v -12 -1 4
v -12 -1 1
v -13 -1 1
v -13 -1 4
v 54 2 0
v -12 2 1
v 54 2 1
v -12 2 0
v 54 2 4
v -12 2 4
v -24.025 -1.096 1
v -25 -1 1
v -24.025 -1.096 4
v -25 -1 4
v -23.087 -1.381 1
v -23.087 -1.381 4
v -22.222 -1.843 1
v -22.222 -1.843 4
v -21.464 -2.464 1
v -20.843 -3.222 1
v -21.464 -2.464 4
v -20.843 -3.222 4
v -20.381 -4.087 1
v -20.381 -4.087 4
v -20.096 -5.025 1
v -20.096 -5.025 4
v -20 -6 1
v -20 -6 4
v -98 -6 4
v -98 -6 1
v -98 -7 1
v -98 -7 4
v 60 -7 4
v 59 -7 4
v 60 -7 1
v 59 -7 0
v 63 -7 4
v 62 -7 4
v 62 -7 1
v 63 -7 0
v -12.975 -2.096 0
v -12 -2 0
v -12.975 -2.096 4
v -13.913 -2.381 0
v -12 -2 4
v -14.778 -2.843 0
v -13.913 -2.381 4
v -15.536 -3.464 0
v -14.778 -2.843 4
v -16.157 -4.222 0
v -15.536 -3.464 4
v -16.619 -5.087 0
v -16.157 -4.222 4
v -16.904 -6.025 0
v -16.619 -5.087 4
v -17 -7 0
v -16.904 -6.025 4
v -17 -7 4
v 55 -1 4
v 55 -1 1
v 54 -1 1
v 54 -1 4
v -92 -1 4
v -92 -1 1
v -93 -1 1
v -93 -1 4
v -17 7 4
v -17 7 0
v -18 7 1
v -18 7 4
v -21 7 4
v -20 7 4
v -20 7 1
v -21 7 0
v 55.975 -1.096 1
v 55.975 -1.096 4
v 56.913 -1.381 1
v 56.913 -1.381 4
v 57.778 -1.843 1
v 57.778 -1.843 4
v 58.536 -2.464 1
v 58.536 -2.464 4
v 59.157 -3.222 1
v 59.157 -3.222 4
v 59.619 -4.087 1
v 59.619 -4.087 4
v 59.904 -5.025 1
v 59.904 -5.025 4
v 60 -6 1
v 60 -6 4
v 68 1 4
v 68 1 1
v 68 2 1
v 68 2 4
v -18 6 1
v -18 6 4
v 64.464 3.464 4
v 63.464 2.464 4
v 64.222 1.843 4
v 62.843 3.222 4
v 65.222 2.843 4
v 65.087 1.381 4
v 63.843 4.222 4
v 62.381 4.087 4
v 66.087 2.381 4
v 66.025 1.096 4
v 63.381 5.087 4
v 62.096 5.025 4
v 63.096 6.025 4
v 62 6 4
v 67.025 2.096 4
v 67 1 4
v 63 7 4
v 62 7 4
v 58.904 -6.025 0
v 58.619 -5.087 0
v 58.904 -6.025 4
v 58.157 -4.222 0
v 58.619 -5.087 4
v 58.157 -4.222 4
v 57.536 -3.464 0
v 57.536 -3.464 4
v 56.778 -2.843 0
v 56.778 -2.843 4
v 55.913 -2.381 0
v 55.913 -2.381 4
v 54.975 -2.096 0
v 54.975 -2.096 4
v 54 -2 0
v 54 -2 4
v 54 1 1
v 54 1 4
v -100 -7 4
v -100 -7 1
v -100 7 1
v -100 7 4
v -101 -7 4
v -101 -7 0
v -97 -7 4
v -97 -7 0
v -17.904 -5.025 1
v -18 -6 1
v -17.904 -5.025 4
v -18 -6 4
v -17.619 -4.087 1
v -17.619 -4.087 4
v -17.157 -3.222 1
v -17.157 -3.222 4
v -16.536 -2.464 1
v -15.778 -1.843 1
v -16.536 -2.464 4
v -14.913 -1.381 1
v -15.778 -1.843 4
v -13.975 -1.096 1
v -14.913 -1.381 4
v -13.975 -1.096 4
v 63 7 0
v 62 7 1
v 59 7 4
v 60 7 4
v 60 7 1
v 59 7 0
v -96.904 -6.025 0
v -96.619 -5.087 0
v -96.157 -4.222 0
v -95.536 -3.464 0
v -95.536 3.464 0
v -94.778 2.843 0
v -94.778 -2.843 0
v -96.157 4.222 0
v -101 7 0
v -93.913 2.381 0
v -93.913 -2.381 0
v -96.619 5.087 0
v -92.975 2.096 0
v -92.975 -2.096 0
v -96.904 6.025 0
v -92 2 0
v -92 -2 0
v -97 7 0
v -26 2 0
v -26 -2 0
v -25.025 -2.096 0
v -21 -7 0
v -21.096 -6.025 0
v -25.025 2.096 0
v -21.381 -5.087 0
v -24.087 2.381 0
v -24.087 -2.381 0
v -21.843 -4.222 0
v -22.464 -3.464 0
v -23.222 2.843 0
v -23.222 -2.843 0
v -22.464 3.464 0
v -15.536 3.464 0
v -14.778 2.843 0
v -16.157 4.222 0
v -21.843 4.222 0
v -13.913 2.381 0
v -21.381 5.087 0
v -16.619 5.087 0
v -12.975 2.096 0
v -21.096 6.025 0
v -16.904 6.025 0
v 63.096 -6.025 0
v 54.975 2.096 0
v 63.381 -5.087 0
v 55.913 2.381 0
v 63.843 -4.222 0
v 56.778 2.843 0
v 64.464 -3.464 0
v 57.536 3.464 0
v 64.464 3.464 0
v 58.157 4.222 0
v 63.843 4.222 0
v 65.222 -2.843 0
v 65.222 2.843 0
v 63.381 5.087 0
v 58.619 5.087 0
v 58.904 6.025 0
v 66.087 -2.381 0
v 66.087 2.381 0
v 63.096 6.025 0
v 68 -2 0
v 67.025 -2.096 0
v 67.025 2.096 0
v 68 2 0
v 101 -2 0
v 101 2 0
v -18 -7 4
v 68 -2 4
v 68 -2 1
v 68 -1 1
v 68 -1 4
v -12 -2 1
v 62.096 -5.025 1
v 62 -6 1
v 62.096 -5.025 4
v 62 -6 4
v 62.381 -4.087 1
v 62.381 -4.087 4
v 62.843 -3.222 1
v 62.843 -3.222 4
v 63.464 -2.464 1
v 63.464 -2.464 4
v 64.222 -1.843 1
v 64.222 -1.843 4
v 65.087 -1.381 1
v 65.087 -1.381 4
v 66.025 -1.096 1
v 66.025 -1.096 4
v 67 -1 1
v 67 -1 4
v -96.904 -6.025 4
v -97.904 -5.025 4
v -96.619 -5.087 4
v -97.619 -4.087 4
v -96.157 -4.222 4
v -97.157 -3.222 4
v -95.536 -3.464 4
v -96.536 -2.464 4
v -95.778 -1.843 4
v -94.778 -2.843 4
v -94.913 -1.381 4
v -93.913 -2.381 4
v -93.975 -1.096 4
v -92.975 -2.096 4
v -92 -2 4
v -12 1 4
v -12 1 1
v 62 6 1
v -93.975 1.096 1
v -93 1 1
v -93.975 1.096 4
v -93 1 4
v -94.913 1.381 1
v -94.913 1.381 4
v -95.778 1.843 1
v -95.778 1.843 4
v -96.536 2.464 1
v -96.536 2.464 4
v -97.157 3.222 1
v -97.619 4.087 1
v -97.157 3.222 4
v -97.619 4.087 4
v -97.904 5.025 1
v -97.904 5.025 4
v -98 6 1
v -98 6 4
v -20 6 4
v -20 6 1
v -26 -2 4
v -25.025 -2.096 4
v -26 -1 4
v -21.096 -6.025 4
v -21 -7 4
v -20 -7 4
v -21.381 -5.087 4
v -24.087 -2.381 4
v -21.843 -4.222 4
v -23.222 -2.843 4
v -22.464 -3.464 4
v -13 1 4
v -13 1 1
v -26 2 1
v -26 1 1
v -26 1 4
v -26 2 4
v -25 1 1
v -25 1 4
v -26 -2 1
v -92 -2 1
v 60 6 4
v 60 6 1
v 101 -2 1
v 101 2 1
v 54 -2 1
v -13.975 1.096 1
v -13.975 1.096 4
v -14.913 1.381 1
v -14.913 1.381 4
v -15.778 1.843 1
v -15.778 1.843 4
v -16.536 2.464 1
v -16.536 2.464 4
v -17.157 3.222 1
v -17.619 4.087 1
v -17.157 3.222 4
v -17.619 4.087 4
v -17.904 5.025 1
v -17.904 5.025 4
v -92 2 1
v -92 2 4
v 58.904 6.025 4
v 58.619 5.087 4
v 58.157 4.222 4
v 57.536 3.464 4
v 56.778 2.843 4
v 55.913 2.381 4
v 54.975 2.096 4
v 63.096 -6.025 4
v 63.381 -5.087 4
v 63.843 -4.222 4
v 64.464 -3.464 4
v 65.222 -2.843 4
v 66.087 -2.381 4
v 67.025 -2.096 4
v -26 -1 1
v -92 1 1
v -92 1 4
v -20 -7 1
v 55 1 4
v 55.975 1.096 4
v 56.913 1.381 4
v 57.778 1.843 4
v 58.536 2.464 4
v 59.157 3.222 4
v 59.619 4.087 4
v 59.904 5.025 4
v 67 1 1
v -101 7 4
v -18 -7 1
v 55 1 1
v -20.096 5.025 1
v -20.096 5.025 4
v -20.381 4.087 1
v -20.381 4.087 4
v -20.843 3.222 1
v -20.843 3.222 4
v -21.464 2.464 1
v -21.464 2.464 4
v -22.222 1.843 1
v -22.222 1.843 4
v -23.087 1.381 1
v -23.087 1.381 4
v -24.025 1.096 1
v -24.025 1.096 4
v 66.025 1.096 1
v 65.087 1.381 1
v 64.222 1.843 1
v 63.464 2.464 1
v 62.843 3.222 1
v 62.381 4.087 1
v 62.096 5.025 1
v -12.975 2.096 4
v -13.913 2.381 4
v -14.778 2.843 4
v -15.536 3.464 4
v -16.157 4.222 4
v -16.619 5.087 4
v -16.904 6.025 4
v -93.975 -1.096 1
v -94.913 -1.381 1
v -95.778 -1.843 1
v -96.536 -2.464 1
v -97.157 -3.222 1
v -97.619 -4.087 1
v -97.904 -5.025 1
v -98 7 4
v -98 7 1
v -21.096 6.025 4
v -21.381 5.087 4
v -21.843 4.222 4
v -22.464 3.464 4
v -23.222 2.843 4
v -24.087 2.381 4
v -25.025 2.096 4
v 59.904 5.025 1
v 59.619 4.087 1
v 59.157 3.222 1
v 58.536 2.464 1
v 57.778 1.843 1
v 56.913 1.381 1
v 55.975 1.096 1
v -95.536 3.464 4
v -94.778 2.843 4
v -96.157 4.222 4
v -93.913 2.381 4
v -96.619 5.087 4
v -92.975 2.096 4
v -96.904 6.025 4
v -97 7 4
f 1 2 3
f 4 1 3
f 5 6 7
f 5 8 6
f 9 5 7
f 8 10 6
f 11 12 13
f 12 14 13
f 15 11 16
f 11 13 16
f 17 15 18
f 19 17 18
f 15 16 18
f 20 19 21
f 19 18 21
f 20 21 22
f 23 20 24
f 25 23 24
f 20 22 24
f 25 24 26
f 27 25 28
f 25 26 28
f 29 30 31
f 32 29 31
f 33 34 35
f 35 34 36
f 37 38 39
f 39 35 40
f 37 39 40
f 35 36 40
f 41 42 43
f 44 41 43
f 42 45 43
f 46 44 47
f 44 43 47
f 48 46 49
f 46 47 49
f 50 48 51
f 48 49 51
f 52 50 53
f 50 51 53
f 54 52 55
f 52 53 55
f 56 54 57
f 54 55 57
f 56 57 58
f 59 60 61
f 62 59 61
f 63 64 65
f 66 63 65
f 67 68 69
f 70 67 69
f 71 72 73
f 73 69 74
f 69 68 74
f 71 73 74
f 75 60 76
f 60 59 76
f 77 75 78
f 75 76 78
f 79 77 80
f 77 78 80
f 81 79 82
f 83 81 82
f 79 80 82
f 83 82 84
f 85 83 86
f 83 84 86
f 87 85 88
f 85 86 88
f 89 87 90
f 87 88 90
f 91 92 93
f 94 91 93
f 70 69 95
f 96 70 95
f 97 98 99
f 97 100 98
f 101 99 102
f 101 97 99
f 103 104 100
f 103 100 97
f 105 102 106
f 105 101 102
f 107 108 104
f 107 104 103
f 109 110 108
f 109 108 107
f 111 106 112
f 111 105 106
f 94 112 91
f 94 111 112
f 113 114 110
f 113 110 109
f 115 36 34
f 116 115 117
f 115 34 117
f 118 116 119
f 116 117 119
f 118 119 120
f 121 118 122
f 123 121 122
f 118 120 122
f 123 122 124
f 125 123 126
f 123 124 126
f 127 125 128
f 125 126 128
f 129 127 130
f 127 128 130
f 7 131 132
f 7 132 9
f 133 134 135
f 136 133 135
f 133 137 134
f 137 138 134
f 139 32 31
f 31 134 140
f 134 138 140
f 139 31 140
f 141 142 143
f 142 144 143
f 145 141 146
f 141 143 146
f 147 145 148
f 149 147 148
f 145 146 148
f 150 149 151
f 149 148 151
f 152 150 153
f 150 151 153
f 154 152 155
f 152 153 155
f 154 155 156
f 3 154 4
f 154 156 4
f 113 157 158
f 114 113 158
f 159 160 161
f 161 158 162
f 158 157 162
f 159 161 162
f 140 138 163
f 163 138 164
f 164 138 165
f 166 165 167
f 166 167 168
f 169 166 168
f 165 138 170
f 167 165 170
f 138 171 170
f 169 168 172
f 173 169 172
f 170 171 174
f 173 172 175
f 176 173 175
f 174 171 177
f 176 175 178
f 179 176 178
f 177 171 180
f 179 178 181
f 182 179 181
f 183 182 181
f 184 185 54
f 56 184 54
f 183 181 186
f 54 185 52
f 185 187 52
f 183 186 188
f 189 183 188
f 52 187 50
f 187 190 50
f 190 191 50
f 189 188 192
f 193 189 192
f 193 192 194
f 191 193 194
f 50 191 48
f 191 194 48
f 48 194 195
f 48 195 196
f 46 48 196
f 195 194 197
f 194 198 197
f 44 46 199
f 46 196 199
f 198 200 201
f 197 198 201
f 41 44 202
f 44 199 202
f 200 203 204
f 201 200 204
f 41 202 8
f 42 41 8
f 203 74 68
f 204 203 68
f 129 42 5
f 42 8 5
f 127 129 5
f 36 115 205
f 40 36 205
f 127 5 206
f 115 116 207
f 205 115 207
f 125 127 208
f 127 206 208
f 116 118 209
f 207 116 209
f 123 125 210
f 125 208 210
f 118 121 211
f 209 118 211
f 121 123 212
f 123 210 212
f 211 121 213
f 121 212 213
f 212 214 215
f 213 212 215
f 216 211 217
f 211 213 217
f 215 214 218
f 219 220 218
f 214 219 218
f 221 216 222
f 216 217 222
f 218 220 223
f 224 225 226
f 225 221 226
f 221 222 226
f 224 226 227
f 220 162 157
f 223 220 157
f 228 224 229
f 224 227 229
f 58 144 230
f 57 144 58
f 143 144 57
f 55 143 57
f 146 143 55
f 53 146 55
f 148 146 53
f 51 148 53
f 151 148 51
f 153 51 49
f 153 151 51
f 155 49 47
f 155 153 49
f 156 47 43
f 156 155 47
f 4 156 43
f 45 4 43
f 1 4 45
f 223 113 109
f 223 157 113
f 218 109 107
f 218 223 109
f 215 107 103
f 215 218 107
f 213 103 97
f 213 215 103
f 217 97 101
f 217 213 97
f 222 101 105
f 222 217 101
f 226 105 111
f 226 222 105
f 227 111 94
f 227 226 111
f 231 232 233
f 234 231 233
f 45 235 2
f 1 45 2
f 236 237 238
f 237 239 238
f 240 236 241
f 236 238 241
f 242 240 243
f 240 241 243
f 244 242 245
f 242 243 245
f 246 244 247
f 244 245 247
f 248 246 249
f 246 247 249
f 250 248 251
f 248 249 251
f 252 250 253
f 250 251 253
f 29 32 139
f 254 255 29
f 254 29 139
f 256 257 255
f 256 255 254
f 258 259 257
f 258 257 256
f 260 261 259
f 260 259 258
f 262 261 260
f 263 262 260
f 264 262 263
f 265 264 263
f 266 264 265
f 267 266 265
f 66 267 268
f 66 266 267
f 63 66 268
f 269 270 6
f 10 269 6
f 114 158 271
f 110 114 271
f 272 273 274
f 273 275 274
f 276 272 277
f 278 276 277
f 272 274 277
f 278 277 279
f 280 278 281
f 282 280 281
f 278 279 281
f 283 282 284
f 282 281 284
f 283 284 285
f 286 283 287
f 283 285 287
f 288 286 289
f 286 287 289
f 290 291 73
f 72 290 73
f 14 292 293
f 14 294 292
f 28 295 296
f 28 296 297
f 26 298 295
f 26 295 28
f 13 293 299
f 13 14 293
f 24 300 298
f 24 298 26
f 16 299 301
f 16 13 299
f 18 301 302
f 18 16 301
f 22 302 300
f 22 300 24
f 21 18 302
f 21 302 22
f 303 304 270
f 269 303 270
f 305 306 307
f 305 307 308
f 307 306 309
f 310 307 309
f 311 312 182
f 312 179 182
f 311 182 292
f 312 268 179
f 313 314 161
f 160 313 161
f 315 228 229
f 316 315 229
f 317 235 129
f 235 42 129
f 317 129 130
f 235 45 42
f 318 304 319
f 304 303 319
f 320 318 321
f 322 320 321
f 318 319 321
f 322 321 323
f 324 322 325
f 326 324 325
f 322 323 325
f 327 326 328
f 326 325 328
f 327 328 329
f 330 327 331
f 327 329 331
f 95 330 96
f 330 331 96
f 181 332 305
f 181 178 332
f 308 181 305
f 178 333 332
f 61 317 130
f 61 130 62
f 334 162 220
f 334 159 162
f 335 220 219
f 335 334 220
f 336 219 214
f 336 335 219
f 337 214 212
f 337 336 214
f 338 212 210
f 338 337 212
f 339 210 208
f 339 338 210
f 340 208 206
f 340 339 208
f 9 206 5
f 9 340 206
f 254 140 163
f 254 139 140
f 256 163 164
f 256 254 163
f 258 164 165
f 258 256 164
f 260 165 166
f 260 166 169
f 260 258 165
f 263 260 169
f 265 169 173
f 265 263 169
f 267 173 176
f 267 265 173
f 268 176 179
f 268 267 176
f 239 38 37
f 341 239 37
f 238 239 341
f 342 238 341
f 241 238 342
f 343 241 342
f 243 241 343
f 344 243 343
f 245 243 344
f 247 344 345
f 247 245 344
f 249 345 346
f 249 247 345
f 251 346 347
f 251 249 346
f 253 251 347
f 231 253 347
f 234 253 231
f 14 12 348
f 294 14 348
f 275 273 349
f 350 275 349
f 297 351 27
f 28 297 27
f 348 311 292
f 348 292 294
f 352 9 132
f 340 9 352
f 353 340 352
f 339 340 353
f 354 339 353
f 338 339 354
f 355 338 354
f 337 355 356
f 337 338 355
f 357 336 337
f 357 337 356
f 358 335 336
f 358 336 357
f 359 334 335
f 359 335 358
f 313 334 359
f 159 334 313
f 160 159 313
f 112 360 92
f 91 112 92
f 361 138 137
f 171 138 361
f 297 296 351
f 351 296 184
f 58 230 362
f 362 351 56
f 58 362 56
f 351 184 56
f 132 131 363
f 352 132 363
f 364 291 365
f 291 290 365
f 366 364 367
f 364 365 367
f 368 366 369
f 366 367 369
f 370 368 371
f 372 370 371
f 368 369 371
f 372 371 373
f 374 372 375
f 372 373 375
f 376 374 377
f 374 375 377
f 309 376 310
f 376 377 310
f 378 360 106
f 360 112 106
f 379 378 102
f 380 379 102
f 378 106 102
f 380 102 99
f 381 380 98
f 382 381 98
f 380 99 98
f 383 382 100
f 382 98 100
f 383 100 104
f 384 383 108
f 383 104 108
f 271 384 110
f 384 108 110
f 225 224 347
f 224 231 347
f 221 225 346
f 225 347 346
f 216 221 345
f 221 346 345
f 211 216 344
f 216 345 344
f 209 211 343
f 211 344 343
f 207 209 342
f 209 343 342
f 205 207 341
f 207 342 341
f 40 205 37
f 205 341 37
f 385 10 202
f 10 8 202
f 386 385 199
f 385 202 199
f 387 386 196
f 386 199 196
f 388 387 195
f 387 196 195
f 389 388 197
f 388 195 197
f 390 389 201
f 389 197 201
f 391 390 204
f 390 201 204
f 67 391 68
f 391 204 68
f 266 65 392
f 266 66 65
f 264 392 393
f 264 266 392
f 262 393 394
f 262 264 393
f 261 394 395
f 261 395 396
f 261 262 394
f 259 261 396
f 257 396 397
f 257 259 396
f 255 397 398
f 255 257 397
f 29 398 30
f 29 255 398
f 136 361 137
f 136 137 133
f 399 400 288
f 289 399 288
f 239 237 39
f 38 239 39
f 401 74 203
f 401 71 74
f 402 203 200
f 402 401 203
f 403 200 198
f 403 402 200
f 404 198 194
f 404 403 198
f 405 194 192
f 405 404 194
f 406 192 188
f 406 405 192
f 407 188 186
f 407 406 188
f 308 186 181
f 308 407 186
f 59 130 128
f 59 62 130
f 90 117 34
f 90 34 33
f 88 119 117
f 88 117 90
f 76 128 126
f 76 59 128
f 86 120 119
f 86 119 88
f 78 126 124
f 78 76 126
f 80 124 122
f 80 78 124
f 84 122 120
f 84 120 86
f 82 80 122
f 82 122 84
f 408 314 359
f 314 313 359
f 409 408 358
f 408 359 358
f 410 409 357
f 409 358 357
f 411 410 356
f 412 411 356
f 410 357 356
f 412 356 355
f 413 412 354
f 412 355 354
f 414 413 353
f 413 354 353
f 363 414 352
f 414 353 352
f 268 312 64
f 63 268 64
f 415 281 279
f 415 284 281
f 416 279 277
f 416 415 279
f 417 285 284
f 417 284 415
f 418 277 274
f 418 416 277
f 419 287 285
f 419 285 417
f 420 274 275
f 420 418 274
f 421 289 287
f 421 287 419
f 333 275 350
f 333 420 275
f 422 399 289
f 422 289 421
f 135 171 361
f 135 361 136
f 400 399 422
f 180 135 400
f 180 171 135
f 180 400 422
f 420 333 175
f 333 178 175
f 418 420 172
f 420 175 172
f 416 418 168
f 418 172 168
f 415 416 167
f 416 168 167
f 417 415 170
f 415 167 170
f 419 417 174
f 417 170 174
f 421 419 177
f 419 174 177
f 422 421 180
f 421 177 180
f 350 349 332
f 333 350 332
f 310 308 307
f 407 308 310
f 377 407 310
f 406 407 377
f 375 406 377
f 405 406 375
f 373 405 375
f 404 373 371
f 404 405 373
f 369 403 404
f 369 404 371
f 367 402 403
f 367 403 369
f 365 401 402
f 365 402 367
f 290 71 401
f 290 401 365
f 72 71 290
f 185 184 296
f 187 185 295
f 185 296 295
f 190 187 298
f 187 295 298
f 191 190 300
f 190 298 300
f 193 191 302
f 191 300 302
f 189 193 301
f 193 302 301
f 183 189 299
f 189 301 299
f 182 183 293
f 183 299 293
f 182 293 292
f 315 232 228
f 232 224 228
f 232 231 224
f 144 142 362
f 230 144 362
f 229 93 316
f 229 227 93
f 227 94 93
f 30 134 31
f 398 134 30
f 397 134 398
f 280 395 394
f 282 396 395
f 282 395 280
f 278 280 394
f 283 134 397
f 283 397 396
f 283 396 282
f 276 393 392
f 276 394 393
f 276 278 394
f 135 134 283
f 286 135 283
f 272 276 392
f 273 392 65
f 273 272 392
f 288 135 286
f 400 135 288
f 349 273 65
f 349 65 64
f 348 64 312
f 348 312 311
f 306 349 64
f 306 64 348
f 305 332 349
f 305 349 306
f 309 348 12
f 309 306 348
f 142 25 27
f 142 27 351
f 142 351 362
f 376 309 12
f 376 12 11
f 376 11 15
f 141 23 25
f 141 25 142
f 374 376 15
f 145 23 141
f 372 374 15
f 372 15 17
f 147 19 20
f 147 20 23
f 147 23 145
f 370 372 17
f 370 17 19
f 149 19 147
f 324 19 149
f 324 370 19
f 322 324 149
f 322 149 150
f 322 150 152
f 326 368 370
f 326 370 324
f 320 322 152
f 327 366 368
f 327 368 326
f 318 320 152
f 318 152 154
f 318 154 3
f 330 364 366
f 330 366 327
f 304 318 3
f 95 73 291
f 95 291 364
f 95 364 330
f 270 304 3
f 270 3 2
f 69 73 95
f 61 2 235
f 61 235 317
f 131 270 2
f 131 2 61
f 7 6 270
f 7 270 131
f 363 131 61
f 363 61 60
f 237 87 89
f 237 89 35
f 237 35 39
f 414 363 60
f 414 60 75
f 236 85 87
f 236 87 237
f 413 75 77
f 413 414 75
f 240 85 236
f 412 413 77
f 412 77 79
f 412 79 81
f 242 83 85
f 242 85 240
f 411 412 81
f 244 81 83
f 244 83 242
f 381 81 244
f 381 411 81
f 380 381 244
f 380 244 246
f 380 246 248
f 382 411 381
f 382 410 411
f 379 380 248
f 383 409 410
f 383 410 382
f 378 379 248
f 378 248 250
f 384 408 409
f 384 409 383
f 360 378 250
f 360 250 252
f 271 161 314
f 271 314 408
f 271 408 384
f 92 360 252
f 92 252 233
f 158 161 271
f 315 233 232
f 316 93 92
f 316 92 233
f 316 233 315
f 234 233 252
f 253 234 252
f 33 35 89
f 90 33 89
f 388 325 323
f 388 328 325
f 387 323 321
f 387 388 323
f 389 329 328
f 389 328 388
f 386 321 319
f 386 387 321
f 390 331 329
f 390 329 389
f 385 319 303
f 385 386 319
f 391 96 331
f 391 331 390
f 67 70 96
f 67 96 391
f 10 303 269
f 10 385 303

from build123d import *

# Parameters (mm, degrees)
F0_W     = 4
F0_H     = 4
F0_H_2   = 5
F0_W_2   = 76
F0_H_3   = 2.5597222634
F0_H_4   = 2.4402777366
F0_W_3   = 38
F1_DEPTH = 1
F2_W     = 1
F2_H     = 14
F2_H_2   = 5
F3_DEPTH = 3
F4_R     = 4.99999
F2_W_2   = 5
F2_H_3   = 1
F5_DEPTH = 3
F6_R     = 4.99999
F7_DEPTH = 3
F8_R     = 4.99999


# Not quite as in the source:
# - a fillet or chamfer is up to 0.001 mm smaller than in the source, because OpenCascade refuses the exact size


with BuildPart() as f1:
    # F0 (on Top) → F1 (new body)
    with BuildSketch(Plane.XY):
        Polygon((-101, 2), (-97, 2), (-97, 4.5597222634), (-97, 7), (-101, 7), align=None)
        with Locations((-99, 0)):
            Rectangle(F0_W, F0_H)
        with Locations((-99, -4.5)):
            Rectangle(F0_W, F0_H_2)
        with Locations((-59, 0)):
            Rectangle(F0_W_2, F0_H)
        with Locations((-19, 3.2798611317)):
            Rectangle(F0_W, F0_H_3)
        with Locations((-19, 0)):
            Rectangle(F0_W, F0_H)
        with Locations((-19, -4.5)):
            Rectangle(F0_W, F0_H_2)
        with Locations((-19, 5.7798611317)):
            Rectangle(F0_W, F0_H_4)
        with Locations((21, 0)):
            Rectangle(F0_W_2, F0_H)
        with Locations((61, 5.7798611317)):
            Rectangle(F0_W, F0_H_4)
        with Locations((61, 3.2798611317)):
            Rectangle(F0_W, F0_H_3)
        with Locations((61, -4.5)):
            Rectangle(F0_W, F0_H_2)
        with Locations((61, 0)):
            Rectangle(F0_W, F0_H)
        with Locations((82, 0)):
            Rectangle(F0_W_3, F0_H)
    extrude(amount=F1_DEPTH)

    # F2 (on face) → F3 (join)
    with BuildSketch(Plane.XY.offset(1)):
        with Locations((-100.5, 0)):
            Rectangle(F2_W, F2_H)
        with Locations((-97.5, 4.5)):
            Rectangle(F2_W, F2_H_2)
        Polygon((-97, 2), (-98, 2), (-98, 1), (-92, 1), (-92, 2), align=None)
        Polygon((-98, -1), (-98, -2), (-97, -2), (-92, -2), (-92, -1), align=None)
        with Locations((-97.5, -4.5)):
            Rectangle(F2_W, F2_H_2)
    extrude(amount=F3_DEPTH)

    # F4 (radius 5 in the source; OpenCascade refuses exactly that, so slightly less here)
    f4_edges = [f1.edges().sort_by_distance(p)[0] for p in [
        (-97, -2, 2),
        (-98, 1, 2.5),
        (-98, -1, 2.5),
        (-97, 2, 2),
    ]]
    fillet(f4_edges, radius=F4_R)

    # F2 (on face) → F5 (join)
    with BuildSketch(Plane.XY.offset(1)):
        Polygon((-21, 7), (-21, 2), (-21, 1), (-20, 1), (-20, 7), align=None)
        Polygon((-17, 7), (-18, 7), (-18, 1), (-17, 1), (-17, 2), align=None)
        with Locations((-14.5, 1.5)):
            Rectangle(F2_W_2, F2_H_3)
        with Locations((-23.5, 1.5)):
            Rectangle(F2_W_2, F2_H_3)
        with Locations((-23.5, -1.5)):
            Rectangle(F2_W_2, F2_H_3)
        Polygon((-21, -1), (-21, -2), (-21, -7), (-20, -7), (-20, -1), align=None)
        with Locations((-14.5, -1.5)):
            Rectangle(F2_W_2, F2_H_3)
        Polygon((-18, -1), (-18, -7), (-17, -7), (-17, -2), (-17, -1), align=None)
    extrude(amount=F5_DEPTH)

    # F6 (radius 5 in the source; OpenCascade refuses exactly that, so slightly less here)
    f6_edges = [f1.edges().sort_by_distance(p)[0] for p in [
        (-18, 1, 2.5),
        (-20, 1, 2.5),
        (-17, -2, 2),
        (-20, -1, 2.5),
        (-21, -2, 2),
        (-21, 2, 2),
        (-17, 2, 2),
        (-18, -1, 2.5),
    ]]
    fillet(f6_edges, radius=F6_R)

    # F2 (on face) → F7 (join)
    with BuildSketch(Plane.XY.offset(1)):
        Polygon((59, 7), (59, 2), (59, 1), (60, 1), (60, 7), align=None)
        with Locations((65.5, 1.5)):
            Rectangle(F2_W_2, F2_H_3)
        Polygon((63, 7), (62, 7), (62, 1), (63, 1), (63, 2), align=None)
        with Locations((65.5, -1.5)):
            Rectangle(F2_W_2, F2_H_3)
        Polygon((62, -1), (62, -7), (63, -7), (63, -2), (63, -1), align=None)
        with Locations((56.5, 1.5)):
            Rectangle(F2_W_2, F2_H_3)
        with Locations((56.5, -1.5)):
            Rectangle(F2_W_2, F2_H_3)
        Polygon((59, -1), (59, -2), (59, -7), (60, -7), (60, -1), align=None)
    extrude(amount=F7_DEPTH)

    # F8 (radius 5 in the source; OpenCascade refuses exactly that, so slightly less here)
    f8_edges = [f1.edges().sort_by_distance(p)[0] for p in [
        (63, -2, 2),
        (60, 1, 2.5),
        (62, 1, 2.5),
        (60, -1, 2.5),
        (62, -1, 2.5),
        (59, -2, 2),
        (59, 2, 2),
        (63, 2, 2),
    ]]
    fillet(f8_edges, radius=F8_R)


solid = f1.part
